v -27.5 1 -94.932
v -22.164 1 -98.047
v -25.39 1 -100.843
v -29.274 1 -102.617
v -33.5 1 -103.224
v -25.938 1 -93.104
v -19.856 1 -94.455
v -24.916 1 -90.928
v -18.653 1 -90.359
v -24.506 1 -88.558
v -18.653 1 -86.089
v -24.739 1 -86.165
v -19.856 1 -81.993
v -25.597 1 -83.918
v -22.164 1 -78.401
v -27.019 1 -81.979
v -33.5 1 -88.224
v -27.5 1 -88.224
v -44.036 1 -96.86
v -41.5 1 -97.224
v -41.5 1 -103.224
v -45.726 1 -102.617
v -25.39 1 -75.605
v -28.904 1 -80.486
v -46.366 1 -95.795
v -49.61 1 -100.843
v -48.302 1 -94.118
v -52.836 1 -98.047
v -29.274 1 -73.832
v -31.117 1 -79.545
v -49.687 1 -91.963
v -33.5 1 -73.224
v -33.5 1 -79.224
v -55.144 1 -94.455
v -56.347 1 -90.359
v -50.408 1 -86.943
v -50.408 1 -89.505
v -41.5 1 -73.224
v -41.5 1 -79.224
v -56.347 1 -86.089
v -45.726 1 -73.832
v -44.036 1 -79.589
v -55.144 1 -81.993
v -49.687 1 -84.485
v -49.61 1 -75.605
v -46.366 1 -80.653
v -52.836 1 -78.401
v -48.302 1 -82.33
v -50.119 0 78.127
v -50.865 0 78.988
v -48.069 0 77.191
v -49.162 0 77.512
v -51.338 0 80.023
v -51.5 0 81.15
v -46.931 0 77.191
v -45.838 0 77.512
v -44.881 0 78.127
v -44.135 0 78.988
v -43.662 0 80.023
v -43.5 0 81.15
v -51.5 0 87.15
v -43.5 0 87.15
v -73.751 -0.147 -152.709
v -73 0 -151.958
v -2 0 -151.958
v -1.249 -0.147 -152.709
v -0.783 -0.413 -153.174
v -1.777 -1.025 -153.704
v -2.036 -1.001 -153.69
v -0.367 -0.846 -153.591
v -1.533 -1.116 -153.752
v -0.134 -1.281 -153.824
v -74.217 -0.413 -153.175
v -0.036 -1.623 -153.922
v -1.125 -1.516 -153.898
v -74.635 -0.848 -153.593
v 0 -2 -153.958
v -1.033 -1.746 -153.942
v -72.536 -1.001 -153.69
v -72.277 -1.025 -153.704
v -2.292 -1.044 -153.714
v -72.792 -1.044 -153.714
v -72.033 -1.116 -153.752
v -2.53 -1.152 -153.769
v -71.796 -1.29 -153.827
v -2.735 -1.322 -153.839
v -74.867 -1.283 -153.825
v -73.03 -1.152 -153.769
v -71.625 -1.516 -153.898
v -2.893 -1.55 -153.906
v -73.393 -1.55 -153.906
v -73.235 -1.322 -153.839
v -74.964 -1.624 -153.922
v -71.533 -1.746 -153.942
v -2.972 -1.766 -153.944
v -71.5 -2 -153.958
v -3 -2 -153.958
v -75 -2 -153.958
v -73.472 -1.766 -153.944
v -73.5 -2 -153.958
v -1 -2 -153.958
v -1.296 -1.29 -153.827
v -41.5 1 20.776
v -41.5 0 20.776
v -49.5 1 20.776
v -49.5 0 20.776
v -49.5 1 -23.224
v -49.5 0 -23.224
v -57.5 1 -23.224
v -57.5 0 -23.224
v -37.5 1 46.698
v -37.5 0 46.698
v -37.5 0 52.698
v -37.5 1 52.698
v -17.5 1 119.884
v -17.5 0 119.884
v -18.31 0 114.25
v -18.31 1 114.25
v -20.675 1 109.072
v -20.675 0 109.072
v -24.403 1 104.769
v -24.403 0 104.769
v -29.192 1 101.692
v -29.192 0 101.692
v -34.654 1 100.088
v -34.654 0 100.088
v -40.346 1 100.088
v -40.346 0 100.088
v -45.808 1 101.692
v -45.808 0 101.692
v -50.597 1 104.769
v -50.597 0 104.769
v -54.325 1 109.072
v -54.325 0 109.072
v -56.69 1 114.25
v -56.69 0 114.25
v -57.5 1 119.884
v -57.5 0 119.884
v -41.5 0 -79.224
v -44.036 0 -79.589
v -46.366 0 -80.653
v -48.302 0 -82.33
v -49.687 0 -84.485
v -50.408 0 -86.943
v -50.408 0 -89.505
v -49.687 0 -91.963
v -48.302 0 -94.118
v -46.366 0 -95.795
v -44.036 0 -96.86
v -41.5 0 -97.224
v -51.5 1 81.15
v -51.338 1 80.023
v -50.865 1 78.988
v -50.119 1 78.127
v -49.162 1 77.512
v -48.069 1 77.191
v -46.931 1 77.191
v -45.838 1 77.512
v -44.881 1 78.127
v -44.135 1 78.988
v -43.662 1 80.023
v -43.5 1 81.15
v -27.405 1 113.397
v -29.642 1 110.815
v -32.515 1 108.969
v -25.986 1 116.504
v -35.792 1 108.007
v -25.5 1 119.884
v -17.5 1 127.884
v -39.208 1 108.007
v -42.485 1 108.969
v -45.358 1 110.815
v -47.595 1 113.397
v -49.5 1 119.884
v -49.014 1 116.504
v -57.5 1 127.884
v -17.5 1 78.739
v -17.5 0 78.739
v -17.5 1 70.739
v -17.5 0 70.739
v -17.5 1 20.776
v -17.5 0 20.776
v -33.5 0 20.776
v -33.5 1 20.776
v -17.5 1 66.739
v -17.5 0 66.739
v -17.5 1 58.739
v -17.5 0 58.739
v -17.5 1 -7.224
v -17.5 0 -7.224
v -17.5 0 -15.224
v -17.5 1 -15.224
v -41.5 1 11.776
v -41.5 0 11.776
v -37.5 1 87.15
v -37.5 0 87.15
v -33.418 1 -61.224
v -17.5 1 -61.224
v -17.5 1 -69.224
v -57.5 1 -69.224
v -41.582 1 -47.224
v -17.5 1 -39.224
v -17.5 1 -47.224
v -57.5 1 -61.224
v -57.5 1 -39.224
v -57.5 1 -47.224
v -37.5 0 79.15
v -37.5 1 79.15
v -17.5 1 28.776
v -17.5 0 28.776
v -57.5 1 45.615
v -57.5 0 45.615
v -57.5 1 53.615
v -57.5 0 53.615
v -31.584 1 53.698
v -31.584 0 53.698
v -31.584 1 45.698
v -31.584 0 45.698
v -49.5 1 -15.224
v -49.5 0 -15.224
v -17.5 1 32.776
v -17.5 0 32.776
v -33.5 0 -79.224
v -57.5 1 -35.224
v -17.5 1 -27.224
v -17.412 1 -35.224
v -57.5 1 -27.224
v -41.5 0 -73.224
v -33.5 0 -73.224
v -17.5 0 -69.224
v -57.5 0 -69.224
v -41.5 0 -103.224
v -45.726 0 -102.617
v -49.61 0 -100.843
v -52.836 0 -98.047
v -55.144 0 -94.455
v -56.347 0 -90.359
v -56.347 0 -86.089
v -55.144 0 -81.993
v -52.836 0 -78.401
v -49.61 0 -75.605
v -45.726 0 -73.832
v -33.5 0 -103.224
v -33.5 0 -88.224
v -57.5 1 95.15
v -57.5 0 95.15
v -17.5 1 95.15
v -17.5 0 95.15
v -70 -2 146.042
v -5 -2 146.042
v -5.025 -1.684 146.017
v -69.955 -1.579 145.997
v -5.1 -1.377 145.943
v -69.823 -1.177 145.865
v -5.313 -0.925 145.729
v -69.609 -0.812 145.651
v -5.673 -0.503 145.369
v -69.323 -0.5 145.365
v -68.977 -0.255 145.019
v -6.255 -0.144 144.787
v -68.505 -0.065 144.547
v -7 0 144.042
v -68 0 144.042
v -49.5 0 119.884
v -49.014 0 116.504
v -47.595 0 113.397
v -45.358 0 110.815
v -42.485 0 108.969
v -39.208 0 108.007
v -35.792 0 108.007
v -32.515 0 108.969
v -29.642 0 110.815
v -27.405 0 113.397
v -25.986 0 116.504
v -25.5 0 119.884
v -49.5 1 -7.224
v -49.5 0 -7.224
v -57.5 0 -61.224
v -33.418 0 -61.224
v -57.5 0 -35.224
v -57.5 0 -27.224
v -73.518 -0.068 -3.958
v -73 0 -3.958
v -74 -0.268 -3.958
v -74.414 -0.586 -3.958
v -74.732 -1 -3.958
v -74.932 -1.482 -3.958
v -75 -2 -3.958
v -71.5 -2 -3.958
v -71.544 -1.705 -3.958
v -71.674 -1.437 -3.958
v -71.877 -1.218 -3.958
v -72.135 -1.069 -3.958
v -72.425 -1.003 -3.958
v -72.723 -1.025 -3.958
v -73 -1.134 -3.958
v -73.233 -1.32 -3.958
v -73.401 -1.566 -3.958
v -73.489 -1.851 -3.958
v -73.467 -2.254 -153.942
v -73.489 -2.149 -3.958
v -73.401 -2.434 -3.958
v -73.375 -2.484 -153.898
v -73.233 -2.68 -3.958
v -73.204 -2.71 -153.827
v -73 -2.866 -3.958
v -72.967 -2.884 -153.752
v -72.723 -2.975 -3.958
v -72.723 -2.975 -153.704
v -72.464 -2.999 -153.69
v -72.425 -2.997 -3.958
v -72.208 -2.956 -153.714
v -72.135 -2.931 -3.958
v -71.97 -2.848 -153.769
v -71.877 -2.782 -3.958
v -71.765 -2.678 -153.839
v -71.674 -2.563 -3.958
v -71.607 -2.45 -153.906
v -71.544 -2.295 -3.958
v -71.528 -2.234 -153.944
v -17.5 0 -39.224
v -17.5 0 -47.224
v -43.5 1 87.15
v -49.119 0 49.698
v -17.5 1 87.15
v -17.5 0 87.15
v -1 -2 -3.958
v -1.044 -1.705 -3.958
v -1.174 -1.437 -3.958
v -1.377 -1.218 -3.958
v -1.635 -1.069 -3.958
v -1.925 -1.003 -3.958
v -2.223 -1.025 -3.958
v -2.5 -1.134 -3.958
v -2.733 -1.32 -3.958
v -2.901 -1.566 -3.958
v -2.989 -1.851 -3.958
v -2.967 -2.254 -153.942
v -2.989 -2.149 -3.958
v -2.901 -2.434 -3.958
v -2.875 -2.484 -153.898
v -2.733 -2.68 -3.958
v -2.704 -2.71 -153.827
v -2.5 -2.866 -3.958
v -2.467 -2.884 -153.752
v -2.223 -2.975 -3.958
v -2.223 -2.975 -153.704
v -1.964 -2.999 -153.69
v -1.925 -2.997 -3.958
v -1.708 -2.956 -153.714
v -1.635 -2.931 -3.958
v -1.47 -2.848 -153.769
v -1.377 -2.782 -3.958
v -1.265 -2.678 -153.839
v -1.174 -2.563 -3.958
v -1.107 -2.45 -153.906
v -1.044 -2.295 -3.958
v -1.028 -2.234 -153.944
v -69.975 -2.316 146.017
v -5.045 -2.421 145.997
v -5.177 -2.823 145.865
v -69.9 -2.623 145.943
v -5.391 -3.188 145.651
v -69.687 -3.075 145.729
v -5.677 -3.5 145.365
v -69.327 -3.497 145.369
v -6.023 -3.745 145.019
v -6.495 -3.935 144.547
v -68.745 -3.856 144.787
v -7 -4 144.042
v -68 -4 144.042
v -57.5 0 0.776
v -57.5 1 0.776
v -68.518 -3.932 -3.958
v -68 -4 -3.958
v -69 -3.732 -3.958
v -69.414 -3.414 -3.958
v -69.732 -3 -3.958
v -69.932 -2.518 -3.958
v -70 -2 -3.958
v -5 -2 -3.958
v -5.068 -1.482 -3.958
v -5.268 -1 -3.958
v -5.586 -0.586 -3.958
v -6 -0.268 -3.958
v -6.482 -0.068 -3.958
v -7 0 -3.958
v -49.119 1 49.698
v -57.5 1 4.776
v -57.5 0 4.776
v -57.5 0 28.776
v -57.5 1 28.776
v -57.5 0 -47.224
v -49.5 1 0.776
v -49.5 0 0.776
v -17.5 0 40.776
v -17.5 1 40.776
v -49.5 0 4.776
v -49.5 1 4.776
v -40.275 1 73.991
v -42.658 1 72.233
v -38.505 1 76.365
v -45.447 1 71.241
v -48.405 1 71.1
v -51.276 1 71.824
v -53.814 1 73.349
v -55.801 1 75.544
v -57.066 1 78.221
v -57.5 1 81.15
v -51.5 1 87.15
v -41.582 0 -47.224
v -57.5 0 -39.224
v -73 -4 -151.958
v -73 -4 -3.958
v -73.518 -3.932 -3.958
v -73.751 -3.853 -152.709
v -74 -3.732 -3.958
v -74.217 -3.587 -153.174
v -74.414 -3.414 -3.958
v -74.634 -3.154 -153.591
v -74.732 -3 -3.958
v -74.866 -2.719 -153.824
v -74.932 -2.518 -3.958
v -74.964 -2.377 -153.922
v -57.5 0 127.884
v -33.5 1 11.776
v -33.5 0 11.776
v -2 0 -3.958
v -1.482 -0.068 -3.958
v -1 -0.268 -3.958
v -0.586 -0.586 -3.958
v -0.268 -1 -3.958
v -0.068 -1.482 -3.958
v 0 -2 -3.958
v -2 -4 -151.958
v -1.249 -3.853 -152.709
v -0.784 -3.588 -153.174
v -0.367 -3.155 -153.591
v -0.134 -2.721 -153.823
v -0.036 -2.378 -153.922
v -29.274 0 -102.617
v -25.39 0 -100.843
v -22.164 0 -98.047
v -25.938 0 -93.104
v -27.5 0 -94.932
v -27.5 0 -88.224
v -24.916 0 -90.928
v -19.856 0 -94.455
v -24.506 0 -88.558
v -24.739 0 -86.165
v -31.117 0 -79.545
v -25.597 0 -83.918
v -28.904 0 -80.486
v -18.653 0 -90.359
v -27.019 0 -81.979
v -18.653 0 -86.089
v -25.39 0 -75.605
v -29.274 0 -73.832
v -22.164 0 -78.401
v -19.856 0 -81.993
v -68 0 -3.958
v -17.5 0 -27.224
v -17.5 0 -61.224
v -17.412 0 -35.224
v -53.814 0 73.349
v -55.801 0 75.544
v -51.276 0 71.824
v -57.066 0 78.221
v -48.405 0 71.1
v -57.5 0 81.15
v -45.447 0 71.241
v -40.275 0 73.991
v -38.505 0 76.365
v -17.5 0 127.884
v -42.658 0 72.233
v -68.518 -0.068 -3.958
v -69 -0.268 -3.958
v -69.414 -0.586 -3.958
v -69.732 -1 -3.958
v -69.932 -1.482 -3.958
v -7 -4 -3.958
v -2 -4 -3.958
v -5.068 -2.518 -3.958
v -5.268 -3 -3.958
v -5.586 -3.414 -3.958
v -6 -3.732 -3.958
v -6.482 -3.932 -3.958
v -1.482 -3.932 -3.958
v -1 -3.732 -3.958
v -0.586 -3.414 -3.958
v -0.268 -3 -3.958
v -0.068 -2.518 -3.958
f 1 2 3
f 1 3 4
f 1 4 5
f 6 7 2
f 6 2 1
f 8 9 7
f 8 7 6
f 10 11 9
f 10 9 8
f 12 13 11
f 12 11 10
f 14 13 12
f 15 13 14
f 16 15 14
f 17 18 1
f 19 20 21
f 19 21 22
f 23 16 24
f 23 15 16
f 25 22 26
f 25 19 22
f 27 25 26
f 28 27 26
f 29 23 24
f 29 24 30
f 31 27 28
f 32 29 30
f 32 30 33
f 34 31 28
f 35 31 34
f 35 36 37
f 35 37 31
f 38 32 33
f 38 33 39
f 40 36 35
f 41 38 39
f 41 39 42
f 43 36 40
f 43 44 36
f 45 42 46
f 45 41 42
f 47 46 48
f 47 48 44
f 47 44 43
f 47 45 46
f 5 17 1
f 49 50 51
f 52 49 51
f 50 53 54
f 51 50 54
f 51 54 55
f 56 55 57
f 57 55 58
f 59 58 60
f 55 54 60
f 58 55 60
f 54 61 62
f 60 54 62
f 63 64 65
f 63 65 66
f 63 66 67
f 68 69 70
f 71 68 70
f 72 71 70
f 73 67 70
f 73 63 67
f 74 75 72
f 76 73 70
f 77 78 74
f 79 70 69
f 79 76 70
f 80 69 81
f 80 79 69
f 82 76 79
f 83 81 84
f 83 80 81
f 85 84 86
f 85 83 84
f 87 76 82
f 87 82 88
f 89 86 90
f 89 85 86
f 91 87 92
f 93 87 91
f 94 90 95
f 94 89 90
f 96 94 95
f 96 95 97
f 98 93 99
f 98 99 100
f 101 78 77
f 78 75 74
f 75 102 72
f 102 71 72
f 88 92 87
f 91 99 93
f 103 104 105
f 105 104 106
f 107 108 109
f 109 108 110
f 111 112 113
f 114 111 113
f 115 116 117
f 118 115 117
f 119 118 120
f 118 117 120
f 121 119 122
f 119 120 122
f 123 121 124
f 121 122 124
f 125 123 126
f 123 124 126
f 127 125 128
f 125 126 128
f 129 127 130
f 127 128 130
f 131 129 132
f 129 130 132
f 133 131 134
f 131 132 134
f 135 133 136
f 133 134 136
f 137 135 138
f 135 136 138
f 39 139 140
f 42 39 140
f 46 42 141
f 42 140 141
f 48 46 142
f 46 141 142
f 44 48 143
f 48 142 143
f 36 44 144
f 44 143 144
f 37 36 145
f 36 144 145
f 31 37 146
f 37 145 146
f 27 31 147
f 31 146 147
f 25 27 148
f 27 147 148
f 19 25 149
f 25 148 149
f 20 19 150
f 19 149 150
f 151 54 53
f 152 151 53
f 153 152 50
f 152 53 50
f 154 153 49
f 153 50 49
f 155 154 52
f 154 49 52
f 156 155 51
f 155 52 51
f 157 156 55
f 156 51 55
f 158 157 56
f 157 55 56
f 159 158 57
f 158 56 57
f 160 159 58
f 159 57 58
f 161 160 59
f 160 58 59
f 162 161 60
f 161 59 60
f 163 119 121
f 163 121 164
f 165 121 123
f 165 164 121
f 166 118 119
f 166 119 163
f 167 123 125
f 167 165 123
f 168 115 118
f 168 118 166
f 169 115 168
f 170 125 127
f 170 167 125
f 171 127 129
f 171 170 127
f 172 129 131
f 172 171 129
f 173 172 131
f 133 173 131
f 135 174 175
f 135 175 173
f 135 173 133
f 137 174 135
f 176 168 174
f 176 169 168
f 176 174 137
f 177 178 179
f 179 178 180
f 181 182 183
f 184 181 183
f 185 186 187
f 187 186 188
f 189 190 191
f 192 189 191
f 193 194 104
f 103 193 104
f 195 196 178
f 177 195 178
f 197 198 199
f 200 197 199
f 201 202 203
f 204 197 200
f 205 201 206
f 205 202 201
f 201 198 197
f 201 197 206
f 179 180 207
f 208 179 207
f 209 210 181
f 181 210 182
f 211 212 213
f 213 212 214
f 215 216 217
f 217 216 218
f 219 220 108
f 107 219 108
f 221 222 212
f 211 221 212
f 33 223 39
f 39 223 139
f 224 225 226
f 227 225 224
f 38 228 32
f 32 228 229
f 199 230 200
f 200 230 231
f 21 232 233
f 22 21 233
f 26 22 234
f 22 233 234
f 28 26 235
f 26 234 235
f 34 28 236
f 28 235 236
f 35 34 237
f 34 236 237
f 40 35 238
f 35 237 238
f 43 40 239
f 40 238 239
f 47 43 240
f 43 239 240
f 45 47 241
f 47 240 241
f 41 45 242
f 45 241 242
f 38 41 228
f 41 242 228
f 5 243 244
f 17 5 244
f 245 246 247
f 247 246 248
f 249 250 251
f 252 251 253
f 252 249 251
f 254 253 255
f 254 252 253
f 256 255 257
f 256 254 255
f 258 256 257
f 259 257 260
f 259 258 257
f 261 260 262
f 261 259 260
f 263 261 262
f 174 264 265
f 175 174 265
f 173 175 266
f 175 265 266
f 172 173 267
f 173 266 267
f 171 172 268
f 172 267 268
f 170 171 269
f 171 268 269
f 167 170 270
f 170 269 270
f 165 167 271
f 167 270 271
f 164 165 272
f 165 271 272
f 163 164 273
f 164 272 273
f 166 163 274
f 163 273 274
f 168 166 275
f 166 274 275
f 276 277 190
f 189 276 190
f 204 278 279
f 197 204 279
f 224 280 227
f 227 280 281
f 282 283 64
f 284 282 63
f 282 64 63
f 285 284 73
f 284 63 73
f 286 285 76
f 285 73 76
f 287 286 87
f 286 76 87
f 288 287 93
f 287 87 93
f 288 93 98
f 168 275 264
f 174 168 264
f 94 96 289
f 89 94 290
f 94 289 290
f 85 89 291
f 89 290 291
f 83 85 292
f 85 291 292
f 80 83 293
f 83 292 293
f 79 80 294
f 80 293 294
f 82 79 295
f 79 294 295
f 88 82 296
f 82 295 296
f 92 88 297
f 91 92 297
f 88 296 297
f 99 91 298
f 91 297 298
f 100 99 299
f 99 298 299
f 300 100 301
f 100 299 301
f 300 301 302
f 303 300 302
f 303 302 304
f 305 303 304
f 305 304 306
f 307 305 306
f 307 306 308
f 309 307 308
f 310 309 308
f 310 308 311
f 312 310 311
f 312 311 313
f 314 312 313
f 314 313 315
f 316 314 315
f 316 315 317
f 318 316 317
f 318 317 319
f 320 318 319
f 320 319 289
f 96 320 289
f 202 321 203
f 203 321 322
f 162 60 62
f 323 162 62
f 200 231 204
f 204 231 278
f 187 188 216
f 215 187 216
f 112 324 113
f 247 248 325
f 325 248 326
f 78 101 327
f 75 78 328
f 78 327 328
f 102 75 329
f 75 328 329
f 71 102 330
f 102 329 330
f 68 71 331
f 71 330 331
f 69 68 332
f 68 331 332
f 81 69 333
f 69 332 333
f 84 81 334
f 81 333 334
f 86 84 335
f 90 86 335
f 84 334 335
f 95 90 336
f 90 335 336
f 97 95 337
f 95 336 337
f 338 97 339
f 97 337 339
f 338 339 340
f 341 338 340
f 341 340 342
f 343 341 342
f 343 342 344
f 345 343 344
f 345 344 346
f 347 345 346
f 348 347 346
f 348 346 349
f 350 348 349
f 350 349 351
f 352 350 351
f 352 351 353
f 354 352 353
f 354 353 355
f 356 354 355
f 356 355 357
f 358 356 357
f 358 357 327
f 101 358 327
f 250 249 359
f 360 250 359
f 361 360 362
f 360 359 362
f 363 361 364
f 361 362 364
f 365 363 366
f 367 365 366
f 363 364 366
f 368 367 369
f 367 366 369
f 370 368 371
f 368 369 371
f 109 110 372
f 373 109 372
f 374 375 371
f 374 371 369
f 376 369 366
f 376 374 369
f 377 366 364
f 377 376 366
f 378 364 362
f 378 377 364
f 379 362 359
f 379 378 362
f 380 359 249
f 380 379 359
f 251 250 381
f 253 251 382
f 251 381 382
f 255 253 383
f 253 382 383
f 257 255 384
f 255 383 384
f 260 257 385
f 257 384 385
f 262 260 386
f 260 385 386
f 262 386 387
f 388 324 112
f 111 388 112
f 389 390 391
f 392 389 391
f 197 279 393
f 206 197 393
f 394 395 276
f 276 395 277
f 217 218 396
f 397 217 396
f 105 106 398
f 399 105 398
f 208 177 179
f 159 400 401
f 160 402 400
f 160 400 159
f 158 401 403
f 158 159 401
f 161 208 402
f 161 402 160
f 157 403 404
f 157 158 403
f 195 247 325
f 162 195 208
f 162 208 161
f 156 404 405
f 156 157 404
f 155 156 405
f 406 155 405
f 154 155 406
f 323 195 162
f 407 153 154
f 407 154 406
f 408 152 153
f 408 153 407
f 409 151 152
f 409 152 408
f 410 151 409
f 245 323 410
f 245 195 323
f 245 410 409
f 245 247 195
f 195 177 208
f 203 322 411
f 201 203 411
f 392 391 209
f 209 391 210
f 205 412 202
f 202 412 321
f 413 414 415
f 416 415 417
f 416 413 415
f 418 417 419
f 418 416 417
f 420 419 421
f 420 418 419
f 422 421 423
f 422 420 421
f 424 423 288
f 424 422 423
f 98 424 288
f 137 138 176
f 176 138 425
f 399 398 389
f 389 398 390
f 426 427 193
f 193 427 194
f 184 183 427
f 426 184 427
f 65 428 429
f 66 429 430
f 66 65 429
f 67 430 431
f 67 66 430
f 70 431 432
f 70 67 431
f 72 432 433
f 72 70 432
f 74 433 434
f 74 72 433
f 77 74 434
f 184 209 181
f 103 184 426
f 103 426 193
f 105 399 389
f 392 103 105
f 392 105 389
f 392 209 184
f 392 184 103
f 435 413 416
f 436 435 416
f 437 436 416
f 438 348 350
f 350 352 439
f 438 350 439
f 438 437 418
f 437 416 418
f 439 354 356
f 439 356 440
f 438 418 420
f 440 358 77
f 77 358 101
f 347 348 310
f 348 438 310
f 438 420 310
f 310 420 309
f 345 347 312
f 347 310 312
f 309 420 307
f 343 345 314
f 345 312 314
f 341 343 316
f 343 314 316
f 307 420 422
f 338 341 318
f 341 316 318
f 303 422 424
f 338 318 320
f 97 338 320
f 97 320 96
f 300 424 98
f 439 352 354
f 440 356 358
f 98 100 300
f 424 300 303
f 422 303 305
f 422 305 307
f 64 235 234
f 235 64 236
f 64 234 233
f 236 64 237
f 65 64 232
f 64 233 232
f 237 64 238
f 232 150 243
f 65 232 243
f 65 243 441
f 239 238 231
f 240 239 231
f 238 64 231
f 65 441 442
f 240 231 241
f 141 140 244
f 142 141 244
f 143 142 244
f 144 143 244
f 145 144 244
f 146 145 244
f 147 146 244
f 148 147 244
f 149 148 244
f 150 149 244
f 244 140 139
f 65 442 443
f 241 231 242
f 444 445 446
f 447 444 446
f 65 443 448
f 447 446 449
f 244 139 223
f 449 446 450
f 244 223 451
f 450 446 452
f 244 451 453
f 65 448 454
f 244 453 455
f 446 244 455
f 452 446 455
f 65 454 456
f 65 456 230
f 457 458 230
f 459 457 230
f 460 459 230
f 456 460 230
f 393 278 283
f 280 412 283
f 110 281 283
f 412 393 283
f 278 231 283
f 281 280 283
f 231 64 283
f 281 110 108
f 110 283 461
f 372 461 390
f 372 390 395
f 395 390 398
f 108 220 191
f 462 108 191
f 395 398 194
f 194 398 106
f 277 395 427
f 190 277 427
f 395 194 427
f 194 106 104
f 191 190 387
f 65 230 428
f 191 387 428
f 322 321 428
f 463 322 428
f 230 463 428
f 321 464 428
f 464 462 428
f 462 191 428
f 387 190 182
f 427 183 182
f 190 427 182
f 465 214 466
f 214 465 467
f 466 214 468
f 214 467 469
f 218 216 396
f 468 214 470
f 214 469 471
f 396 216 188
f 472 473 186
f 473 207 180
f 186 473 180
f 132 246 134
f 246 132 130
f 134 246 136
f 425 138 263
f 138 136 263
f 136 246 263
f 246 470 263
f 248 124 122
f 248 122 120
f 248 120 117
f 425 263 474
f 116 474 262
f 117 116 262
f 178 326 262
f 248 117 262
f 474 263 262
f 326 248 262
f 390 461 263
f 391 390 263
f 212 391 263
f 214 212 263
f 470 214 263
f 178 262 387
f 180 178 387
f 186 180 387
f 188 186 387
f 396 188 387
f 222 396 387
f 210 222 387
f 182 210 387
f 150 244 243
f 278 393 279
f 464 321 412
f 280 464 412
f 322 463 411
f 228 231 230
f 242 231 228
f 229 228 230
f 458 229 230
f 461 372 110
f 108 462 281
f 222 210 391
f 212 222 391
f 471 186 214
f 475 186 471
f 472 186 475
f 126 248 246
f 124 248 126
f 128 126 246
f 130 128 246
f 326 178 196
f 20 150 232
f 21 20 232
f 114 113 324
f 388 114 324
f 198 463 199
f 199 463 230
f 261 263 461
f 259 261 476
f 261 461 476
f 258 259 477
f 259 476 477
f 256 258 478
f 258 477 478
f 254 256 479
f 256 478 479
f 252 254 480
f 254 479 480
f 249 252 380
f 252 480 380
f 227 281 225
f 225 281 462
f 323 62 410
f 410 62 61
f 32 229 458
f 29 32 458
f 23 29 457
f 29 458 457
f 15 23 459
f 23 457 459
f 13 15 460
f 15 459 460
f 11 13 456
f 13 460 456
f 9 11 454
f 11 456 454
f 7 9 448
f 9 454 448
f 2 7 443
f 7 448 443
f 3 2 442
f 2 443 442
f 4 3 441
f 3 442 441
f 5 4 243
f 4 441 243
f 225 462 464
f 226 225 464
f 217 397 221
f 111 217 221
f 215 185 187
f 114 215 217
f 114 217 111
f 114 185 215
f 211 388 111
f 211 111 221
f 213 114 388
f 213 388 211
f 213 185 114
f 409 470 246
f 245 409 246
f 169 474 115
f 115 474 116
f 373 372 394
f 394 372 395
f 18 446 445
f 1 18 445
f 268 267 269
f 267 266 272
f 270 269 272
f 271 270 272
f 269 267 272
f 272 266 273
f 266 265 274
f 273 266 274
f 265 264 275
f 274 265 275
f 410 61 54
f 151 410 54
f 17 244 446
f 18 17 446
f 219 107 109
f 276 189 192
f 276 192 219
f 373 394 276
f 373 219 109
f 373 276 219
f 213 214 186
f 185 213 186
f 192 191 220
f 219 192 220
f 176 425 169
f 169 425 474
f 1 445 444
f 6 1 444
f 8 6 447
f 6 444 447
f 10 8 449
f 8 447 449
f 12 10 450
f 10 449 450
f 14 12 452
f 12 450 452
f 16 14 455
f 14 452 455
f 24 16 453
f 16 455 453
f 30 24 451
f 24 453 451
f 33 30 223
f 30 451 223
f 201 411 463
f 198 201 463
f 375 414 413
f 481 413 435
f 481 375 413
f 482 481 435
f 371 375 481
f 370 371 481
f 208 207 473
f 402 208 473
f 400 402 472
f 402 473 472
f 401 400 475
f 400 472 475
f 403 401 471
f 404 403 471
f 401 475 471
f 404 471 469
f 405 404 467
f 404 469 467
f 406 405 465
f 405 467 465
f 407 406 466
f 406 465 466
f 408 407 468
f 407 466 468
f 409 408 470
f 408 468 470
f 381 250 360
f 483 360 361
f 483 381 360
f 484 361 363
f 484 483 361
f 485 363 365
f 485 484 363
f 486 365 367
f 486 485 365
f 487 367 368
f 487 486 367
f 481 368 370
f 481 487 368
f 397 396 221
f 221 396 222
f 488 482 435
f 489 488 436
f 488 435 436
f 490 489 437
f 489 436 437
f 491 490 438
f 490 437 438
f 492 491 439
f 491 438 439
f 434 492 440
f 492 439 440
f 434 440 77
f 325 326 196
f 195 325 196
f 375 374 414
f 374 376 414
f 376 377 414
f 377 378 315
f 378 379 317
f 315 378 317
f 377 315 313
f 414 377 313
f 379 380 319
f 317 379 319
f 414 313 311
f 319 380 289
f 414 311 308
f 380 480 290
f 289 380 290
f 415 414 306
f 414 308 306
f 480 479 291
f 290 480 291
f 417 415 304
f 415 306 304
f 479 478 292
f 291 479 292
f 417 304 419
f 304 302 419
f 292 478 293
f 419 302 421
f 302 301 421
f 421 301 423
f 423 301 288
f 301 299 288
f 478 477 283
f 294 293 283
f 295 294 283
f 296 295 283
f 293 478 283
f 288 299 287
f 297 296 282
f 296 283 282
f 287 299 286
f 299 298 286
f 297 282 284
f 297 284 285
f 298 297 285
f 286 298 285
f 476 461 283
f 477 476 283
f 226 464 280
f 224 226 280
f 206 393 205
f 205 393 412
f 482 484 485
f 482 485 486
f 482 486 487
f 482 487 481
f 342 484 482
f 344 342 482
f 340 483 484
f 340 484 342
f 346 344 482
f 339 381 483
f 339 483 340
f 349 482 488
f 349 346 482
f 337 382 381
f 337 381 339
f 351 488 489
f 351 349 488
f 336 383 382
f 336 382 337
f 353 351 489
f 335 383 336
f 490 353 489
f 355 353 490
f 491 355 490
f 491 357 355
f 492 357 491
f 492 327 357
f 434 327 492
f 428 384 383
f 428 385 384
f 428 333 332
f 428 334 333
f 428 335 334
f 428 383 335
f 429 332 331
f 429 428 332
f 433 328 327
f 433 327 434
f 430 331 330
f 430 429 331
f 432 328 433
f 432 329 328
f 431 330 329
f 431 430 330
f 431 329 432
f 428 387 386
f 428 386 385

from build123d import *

# Parameters (mm, degrees)
F1_DEPTH    = 4
F2_R        = 1
F3_DEPTH    = 160.54546
F4_T1_DEPTH = 160
F4_T3_DEPTH = 155
F4_T5_DEPTH = 75
F4_T7_DEPTH = 85
F5_R        = 1
F6_DEPTH    = 158.34369
F8_DEPTH    = 1


# Not quite as in the source:
# - a fillet or chamfer that OpenCascade refuses, or shapes differently, is made with other operations: its cross-section is extruded or revolved along the edge and cut away or added


with BuildPart() as f1:
    # F0 (on Front) → F1 (new body)
    with BuildSketch(Plane.XZ):
        Polygon((-75, -3.9577843381), (-75, -153.9577843381), (0, -153.9577843381), (0, -3.9577843381), (-5, -3.9577843381), (-5, 146.0422156619), (-70, 146.0422156619), (-70, -3.9577843381), align=None)
    extrude(amount=F1_DEPTH)

    # F2 (on face) → F3 (cut)
    with BuildSketch(Plane.XY.offset(-3.9577843381)):
        with Locations((-72.5, -2)):
            Circle(F2_R)
    extrude(amount=-F3_DEPTH, mode=Mode.SUBTRACT)

    # F4: fillet of radius 2 on 12 edges, made by hand

    # F4_s2 → F4_t1 (cut)
    with BuildSketch(Plane.XY.offset(-158.9577843381)):
        with BuildLine():
            ThreePointArc((-73, -4), (-74.4142135624, -3.4142135624), (-75, -2))
            Line((-75, -2), (-75, -4))
            Line((-75, -4), (-73, -4))
        make_face()
        with BuildLine():
            ThreePointArc((-73, 0), (-74.4142135624, -0.5857864376), (-75, -2))
            Line((-75, -2), (-75, 0))
            Line((-75, 0), (-73, 0))
        make_face()
        with BuildLine():
            ThreePointArc((-2, 0), (-0.5857864376, -0.5857864376), (0, -2))
            Line((0, -2), (0, 0))
            Line((0, 0), (-2, 0))
        make_face()
        with BuildLine():
            ThreePointArc((-2, -4), (-0.5857864376, -3.4142135624), (0, -2))
            Line((0, -2), (0, -4))
            Line((0, -4), (-2, -4))
        make_face()
    extrude(amount=F4_T1_DEPTH, mode=Mode.SUBTRACT)

    # F4_s4 → F4_t3 (cut)
    with BuildSketch(Plane.XY.offset(-3.9577843381)):
        with BuildLine():
            ThreePointArc((-68, -4), (-69.4142135624, -3.4142135624), (-70, -2))
            Line((-70, -2), (-70, -4))
            Line((-70, -4), (-68, -4))
        make_face()
        with BuildLine():
            ThreePointArc((-68, 0), (-69.4142135624, -0.5857864376), (-70, -2))
            Line((-70, -2), (-70, 0))
            Line((-70, 0), (-68, 0))
        make_face()
        with BuildLine():
            ThreePointArc((-5, -2), (-5.5857864376, -0.5857864376), (-7, 0))
            Line((-7, 0), (-5, 0))
            Line((-5, 0), (-5, -2))
        make_face()
        with BuildLine():
            ThreePointArc((-5, -2), (-5.5857864376, -3.4142135624), (-7, -4))
            Line((-7, -4), (-5, -4))
            Line((-5, -4), (-5, -2))
        make_face()
    extrude(amount=F4_T3_DEPTH, mode=Mode.SUBTRACT)

    # F4_s6 → F4_t5 (cut)
    with BuildSketch(Plane.YZ.offset(-75)):
        with BuildLine():
            ThreePointArc((-2, 146.0422156619), (-3.4142135624, 145.4564292243), (-4, 144.0422156619))
            Line((-4, 144.0422156619), (-4, 146.0422156619))
            Line((-4, 146.0422156619), (-2, 146.0422156619))
        make_face()
        with BuildLine():
            ThreePointArc((-2, 146.0422156619), (-0.5857864376, 145.4564292243), (0, 144.0422156619))
            Line((0, 144.0422156619), (0, 146.0422156619))
            Line((0, 146.0422156619), (-2, 146.0422156619))
        make_face()
    extrude(amount=F4_T5_DEPTH, mode=Mode.SUBTRACT)

    # F4_s8 → F4_t7 (cut)
    with BuildSketch(Plane.YZ.offset(-80)):
        with BuildLine():
            ThreePointArc((-4, -151.9577843381), (-3.4142135624, -153.3719979004), (-2, -153.9577843381))
            Line((-2, -153.9577843381), (-4, -153.9577843381))
            Line((-4, -153.9577843381), (-4, -151.9577843381))
        make_face()
        with BuildLine():
            ThreePointArc((0, -151.9577843381), (-0.5857864376, -153.3719979004), (-2, -153.9577843381))
            Line((-2, -153.9577843381), (0, -153.9577843381))
            Line((0, -153.9577843381), (0, -151.9577843381))
        make_face()
    extrude(amount=F4_T7_DEPTH, mode=Mode.SUBTRACT)

    # F5 (on face) → F6 (cut)
    with BuildSketch(Plane.XY.offset(-3.9577843381)):
        with Locations((-2, -2)):
            Circle(F5_R)
    extrude(amount=-F6_DEPTH, mode=Mode.SUBTRACT)

    # F7 (on face) → F8 (join)
    with BuildSketch(Plane(origin=(0, 0, 0), x_dir=(-1, 0, 0), z_dir=(0, 1, 0))):
        with BuildLine():
            Line((57.5, 127.8843627218), (17.5, 127.8843627218))
            Line((17.5, 127.8843627218), (17.5, 119.8843627218))
            ThreePointArc((17.5, 119.8843627218), (37.5, 99.8843627218), (57.5, 119.8843627218))
            Line((57.5, 119.8843627218), (57.5, 127.8843627218))
        make_face()
        with BuildLine():
            Line((25.5, 119.8843627218), (49.5, 119.8843627218))
            ThreePointArc((49.5, 119.8843627218), (37.5, 107.8843627218), (25.5, 119.8843627218))
        make_face(mode=Mode.SUBTRACT)
        with BuildLine():
            Line((57.5, 95.1502709985), (17.5, 95.1502709985))
            Line((17.5, 95.1502709985), (17.5, 87.1502709985))
            Line((17.5, 87.1502709985), (37.5, 87.1502709985))
            Line((37.5, 87.1502709985), (17.5, 78.7390248019))
            Line((17.5, 78.7390248019), (17.5, 70.7390248019))
            Line((17.5, 70.7390248019), (37.5, 79.1502709985))
            ThreePointArc((37.5, 79.1502709985), (48.4049875621, 71.1003953774), (57.5, 81.1502709985))
            Line((57.5, 81.1502709985), (57.5, 87.1502709985))
            Line((57.5, 87.1502709985), (57.5, 95.1502709985))
        make_face()
        with BuildLine():
            Line((43.5, 87.1502709985), (51.5, 87.1502709985))
            Line((51.5, 87.1502709985), (51.5, 81.1502709985))
            ThreePointArc((51.5, 81.1502709985), (47.5, 77.1502709985), (43.5, 81.1502709985))
            Line((43.5, 81.1502709985), (43.5, 87.1502709985))
        make_face(mode=Mode.SUBTRACT)
        Polygon((57.5, 53.6148357394), (17.5, 66.7390248019), (17.5, 58.7390248019), (31.5839202169, 53.6984175146), (31.5839202169, 45.6984175146), (17.5, 40.7758287685), (17.5, 32.7758287685), (57.5, 45.6148357394), align=None)
        Polygon((37.5, 52.6984175146), (49.1189500386, 49.6984175146), (37.5, 46.6984175146), align=None, mode=Mode.SUBTRACT)
        Polygon((57.5, 28.7758287685), (17.5, 28.7758287685), (17.5, 20.7758287685), (33.5, 20.7758287685), (33.5, 11.7758287685), (41.5, 11.7758287685), (41.5, 20.7758287685), (49.5, 20.7758287685), (49.5, 4.7758287685), (57.5, 4.7758287685), align=None)
        Polygon((57.5, -23.2241712315), (57.5, 0.7758287685), (49.5, 0.7758287685), (49.5, -7.2241712315), (17.5, -7.2241712315), (17.5, -15.2241712315), (49.5, -15.2241712315), (49.5, -23.2241712315), align=None)
        Polygon((57.5, -35.2241712315), (57.5, -27.2241712315), (17.5, -27.2241712315), (17.4124501646, -35.2241712315), align=None)
        Polygon((57.5, -47.2241712315), (57.5, -39.2241712315), (17.5, -39.2241712315), (17.5, -47.2241712315), (41.5822874359, -47.2241712315), (17.5, -61.2241712315), (17.5, -69.2241712315), (57.5, -69.2241712315), (57.5, -61.2241712315), (33.4177125641, -61.2241712315), align=None)
        with BuildLine():
            Line((41.5, -97.2241712315), (41.5, -103.2241712315))
            ThreePointArc((41.5, -103.2241712315), (56.5, -88.2241712315), (41.5, -73.2241712315))
            Line((41.5, -73.2241712315), (33.5, -73.2241712315))
            ThreePointArc((33.5, -73.2241712315), (18.5, -88.2241712315), (33.5, -103.2241712315))
            Line((33.5, -103.2241712315), (33.5, -97.2241712315))
            ThreePointArc((33.5, -97.2241712315), (30.288601192, -96.6317224622), (27.5, -94.932375164))
            ThreePointArc((27.5, -94.932375164), (25.0924487693, -85.0127724236), (33.5, -79.2241712315))
            Line((33.5, -79.2241712315), (41.5, -79.2241712315))
            ThreePointArc((41.5, -79.2241712315), (50.5, -88.2241712315), (41.5, -97.2241712315))
        make_face()
        with BuildLine():
            ThreePointArc((27.5, -94.932375164), (30.288601192, -96.6317224622), (33.5, -97.2241712315))
            Line((33.5, -97.2241712315), (33.5, -88.2241712315))
            Line((33.5, -88.2241712315), (27.5, -88.2241712315))
            Line((27.5, -88.2241712315), (27.5, -94.932375164))
        make_face()
    extrude(amount=F8_DEPTH)


solid = f1.part
